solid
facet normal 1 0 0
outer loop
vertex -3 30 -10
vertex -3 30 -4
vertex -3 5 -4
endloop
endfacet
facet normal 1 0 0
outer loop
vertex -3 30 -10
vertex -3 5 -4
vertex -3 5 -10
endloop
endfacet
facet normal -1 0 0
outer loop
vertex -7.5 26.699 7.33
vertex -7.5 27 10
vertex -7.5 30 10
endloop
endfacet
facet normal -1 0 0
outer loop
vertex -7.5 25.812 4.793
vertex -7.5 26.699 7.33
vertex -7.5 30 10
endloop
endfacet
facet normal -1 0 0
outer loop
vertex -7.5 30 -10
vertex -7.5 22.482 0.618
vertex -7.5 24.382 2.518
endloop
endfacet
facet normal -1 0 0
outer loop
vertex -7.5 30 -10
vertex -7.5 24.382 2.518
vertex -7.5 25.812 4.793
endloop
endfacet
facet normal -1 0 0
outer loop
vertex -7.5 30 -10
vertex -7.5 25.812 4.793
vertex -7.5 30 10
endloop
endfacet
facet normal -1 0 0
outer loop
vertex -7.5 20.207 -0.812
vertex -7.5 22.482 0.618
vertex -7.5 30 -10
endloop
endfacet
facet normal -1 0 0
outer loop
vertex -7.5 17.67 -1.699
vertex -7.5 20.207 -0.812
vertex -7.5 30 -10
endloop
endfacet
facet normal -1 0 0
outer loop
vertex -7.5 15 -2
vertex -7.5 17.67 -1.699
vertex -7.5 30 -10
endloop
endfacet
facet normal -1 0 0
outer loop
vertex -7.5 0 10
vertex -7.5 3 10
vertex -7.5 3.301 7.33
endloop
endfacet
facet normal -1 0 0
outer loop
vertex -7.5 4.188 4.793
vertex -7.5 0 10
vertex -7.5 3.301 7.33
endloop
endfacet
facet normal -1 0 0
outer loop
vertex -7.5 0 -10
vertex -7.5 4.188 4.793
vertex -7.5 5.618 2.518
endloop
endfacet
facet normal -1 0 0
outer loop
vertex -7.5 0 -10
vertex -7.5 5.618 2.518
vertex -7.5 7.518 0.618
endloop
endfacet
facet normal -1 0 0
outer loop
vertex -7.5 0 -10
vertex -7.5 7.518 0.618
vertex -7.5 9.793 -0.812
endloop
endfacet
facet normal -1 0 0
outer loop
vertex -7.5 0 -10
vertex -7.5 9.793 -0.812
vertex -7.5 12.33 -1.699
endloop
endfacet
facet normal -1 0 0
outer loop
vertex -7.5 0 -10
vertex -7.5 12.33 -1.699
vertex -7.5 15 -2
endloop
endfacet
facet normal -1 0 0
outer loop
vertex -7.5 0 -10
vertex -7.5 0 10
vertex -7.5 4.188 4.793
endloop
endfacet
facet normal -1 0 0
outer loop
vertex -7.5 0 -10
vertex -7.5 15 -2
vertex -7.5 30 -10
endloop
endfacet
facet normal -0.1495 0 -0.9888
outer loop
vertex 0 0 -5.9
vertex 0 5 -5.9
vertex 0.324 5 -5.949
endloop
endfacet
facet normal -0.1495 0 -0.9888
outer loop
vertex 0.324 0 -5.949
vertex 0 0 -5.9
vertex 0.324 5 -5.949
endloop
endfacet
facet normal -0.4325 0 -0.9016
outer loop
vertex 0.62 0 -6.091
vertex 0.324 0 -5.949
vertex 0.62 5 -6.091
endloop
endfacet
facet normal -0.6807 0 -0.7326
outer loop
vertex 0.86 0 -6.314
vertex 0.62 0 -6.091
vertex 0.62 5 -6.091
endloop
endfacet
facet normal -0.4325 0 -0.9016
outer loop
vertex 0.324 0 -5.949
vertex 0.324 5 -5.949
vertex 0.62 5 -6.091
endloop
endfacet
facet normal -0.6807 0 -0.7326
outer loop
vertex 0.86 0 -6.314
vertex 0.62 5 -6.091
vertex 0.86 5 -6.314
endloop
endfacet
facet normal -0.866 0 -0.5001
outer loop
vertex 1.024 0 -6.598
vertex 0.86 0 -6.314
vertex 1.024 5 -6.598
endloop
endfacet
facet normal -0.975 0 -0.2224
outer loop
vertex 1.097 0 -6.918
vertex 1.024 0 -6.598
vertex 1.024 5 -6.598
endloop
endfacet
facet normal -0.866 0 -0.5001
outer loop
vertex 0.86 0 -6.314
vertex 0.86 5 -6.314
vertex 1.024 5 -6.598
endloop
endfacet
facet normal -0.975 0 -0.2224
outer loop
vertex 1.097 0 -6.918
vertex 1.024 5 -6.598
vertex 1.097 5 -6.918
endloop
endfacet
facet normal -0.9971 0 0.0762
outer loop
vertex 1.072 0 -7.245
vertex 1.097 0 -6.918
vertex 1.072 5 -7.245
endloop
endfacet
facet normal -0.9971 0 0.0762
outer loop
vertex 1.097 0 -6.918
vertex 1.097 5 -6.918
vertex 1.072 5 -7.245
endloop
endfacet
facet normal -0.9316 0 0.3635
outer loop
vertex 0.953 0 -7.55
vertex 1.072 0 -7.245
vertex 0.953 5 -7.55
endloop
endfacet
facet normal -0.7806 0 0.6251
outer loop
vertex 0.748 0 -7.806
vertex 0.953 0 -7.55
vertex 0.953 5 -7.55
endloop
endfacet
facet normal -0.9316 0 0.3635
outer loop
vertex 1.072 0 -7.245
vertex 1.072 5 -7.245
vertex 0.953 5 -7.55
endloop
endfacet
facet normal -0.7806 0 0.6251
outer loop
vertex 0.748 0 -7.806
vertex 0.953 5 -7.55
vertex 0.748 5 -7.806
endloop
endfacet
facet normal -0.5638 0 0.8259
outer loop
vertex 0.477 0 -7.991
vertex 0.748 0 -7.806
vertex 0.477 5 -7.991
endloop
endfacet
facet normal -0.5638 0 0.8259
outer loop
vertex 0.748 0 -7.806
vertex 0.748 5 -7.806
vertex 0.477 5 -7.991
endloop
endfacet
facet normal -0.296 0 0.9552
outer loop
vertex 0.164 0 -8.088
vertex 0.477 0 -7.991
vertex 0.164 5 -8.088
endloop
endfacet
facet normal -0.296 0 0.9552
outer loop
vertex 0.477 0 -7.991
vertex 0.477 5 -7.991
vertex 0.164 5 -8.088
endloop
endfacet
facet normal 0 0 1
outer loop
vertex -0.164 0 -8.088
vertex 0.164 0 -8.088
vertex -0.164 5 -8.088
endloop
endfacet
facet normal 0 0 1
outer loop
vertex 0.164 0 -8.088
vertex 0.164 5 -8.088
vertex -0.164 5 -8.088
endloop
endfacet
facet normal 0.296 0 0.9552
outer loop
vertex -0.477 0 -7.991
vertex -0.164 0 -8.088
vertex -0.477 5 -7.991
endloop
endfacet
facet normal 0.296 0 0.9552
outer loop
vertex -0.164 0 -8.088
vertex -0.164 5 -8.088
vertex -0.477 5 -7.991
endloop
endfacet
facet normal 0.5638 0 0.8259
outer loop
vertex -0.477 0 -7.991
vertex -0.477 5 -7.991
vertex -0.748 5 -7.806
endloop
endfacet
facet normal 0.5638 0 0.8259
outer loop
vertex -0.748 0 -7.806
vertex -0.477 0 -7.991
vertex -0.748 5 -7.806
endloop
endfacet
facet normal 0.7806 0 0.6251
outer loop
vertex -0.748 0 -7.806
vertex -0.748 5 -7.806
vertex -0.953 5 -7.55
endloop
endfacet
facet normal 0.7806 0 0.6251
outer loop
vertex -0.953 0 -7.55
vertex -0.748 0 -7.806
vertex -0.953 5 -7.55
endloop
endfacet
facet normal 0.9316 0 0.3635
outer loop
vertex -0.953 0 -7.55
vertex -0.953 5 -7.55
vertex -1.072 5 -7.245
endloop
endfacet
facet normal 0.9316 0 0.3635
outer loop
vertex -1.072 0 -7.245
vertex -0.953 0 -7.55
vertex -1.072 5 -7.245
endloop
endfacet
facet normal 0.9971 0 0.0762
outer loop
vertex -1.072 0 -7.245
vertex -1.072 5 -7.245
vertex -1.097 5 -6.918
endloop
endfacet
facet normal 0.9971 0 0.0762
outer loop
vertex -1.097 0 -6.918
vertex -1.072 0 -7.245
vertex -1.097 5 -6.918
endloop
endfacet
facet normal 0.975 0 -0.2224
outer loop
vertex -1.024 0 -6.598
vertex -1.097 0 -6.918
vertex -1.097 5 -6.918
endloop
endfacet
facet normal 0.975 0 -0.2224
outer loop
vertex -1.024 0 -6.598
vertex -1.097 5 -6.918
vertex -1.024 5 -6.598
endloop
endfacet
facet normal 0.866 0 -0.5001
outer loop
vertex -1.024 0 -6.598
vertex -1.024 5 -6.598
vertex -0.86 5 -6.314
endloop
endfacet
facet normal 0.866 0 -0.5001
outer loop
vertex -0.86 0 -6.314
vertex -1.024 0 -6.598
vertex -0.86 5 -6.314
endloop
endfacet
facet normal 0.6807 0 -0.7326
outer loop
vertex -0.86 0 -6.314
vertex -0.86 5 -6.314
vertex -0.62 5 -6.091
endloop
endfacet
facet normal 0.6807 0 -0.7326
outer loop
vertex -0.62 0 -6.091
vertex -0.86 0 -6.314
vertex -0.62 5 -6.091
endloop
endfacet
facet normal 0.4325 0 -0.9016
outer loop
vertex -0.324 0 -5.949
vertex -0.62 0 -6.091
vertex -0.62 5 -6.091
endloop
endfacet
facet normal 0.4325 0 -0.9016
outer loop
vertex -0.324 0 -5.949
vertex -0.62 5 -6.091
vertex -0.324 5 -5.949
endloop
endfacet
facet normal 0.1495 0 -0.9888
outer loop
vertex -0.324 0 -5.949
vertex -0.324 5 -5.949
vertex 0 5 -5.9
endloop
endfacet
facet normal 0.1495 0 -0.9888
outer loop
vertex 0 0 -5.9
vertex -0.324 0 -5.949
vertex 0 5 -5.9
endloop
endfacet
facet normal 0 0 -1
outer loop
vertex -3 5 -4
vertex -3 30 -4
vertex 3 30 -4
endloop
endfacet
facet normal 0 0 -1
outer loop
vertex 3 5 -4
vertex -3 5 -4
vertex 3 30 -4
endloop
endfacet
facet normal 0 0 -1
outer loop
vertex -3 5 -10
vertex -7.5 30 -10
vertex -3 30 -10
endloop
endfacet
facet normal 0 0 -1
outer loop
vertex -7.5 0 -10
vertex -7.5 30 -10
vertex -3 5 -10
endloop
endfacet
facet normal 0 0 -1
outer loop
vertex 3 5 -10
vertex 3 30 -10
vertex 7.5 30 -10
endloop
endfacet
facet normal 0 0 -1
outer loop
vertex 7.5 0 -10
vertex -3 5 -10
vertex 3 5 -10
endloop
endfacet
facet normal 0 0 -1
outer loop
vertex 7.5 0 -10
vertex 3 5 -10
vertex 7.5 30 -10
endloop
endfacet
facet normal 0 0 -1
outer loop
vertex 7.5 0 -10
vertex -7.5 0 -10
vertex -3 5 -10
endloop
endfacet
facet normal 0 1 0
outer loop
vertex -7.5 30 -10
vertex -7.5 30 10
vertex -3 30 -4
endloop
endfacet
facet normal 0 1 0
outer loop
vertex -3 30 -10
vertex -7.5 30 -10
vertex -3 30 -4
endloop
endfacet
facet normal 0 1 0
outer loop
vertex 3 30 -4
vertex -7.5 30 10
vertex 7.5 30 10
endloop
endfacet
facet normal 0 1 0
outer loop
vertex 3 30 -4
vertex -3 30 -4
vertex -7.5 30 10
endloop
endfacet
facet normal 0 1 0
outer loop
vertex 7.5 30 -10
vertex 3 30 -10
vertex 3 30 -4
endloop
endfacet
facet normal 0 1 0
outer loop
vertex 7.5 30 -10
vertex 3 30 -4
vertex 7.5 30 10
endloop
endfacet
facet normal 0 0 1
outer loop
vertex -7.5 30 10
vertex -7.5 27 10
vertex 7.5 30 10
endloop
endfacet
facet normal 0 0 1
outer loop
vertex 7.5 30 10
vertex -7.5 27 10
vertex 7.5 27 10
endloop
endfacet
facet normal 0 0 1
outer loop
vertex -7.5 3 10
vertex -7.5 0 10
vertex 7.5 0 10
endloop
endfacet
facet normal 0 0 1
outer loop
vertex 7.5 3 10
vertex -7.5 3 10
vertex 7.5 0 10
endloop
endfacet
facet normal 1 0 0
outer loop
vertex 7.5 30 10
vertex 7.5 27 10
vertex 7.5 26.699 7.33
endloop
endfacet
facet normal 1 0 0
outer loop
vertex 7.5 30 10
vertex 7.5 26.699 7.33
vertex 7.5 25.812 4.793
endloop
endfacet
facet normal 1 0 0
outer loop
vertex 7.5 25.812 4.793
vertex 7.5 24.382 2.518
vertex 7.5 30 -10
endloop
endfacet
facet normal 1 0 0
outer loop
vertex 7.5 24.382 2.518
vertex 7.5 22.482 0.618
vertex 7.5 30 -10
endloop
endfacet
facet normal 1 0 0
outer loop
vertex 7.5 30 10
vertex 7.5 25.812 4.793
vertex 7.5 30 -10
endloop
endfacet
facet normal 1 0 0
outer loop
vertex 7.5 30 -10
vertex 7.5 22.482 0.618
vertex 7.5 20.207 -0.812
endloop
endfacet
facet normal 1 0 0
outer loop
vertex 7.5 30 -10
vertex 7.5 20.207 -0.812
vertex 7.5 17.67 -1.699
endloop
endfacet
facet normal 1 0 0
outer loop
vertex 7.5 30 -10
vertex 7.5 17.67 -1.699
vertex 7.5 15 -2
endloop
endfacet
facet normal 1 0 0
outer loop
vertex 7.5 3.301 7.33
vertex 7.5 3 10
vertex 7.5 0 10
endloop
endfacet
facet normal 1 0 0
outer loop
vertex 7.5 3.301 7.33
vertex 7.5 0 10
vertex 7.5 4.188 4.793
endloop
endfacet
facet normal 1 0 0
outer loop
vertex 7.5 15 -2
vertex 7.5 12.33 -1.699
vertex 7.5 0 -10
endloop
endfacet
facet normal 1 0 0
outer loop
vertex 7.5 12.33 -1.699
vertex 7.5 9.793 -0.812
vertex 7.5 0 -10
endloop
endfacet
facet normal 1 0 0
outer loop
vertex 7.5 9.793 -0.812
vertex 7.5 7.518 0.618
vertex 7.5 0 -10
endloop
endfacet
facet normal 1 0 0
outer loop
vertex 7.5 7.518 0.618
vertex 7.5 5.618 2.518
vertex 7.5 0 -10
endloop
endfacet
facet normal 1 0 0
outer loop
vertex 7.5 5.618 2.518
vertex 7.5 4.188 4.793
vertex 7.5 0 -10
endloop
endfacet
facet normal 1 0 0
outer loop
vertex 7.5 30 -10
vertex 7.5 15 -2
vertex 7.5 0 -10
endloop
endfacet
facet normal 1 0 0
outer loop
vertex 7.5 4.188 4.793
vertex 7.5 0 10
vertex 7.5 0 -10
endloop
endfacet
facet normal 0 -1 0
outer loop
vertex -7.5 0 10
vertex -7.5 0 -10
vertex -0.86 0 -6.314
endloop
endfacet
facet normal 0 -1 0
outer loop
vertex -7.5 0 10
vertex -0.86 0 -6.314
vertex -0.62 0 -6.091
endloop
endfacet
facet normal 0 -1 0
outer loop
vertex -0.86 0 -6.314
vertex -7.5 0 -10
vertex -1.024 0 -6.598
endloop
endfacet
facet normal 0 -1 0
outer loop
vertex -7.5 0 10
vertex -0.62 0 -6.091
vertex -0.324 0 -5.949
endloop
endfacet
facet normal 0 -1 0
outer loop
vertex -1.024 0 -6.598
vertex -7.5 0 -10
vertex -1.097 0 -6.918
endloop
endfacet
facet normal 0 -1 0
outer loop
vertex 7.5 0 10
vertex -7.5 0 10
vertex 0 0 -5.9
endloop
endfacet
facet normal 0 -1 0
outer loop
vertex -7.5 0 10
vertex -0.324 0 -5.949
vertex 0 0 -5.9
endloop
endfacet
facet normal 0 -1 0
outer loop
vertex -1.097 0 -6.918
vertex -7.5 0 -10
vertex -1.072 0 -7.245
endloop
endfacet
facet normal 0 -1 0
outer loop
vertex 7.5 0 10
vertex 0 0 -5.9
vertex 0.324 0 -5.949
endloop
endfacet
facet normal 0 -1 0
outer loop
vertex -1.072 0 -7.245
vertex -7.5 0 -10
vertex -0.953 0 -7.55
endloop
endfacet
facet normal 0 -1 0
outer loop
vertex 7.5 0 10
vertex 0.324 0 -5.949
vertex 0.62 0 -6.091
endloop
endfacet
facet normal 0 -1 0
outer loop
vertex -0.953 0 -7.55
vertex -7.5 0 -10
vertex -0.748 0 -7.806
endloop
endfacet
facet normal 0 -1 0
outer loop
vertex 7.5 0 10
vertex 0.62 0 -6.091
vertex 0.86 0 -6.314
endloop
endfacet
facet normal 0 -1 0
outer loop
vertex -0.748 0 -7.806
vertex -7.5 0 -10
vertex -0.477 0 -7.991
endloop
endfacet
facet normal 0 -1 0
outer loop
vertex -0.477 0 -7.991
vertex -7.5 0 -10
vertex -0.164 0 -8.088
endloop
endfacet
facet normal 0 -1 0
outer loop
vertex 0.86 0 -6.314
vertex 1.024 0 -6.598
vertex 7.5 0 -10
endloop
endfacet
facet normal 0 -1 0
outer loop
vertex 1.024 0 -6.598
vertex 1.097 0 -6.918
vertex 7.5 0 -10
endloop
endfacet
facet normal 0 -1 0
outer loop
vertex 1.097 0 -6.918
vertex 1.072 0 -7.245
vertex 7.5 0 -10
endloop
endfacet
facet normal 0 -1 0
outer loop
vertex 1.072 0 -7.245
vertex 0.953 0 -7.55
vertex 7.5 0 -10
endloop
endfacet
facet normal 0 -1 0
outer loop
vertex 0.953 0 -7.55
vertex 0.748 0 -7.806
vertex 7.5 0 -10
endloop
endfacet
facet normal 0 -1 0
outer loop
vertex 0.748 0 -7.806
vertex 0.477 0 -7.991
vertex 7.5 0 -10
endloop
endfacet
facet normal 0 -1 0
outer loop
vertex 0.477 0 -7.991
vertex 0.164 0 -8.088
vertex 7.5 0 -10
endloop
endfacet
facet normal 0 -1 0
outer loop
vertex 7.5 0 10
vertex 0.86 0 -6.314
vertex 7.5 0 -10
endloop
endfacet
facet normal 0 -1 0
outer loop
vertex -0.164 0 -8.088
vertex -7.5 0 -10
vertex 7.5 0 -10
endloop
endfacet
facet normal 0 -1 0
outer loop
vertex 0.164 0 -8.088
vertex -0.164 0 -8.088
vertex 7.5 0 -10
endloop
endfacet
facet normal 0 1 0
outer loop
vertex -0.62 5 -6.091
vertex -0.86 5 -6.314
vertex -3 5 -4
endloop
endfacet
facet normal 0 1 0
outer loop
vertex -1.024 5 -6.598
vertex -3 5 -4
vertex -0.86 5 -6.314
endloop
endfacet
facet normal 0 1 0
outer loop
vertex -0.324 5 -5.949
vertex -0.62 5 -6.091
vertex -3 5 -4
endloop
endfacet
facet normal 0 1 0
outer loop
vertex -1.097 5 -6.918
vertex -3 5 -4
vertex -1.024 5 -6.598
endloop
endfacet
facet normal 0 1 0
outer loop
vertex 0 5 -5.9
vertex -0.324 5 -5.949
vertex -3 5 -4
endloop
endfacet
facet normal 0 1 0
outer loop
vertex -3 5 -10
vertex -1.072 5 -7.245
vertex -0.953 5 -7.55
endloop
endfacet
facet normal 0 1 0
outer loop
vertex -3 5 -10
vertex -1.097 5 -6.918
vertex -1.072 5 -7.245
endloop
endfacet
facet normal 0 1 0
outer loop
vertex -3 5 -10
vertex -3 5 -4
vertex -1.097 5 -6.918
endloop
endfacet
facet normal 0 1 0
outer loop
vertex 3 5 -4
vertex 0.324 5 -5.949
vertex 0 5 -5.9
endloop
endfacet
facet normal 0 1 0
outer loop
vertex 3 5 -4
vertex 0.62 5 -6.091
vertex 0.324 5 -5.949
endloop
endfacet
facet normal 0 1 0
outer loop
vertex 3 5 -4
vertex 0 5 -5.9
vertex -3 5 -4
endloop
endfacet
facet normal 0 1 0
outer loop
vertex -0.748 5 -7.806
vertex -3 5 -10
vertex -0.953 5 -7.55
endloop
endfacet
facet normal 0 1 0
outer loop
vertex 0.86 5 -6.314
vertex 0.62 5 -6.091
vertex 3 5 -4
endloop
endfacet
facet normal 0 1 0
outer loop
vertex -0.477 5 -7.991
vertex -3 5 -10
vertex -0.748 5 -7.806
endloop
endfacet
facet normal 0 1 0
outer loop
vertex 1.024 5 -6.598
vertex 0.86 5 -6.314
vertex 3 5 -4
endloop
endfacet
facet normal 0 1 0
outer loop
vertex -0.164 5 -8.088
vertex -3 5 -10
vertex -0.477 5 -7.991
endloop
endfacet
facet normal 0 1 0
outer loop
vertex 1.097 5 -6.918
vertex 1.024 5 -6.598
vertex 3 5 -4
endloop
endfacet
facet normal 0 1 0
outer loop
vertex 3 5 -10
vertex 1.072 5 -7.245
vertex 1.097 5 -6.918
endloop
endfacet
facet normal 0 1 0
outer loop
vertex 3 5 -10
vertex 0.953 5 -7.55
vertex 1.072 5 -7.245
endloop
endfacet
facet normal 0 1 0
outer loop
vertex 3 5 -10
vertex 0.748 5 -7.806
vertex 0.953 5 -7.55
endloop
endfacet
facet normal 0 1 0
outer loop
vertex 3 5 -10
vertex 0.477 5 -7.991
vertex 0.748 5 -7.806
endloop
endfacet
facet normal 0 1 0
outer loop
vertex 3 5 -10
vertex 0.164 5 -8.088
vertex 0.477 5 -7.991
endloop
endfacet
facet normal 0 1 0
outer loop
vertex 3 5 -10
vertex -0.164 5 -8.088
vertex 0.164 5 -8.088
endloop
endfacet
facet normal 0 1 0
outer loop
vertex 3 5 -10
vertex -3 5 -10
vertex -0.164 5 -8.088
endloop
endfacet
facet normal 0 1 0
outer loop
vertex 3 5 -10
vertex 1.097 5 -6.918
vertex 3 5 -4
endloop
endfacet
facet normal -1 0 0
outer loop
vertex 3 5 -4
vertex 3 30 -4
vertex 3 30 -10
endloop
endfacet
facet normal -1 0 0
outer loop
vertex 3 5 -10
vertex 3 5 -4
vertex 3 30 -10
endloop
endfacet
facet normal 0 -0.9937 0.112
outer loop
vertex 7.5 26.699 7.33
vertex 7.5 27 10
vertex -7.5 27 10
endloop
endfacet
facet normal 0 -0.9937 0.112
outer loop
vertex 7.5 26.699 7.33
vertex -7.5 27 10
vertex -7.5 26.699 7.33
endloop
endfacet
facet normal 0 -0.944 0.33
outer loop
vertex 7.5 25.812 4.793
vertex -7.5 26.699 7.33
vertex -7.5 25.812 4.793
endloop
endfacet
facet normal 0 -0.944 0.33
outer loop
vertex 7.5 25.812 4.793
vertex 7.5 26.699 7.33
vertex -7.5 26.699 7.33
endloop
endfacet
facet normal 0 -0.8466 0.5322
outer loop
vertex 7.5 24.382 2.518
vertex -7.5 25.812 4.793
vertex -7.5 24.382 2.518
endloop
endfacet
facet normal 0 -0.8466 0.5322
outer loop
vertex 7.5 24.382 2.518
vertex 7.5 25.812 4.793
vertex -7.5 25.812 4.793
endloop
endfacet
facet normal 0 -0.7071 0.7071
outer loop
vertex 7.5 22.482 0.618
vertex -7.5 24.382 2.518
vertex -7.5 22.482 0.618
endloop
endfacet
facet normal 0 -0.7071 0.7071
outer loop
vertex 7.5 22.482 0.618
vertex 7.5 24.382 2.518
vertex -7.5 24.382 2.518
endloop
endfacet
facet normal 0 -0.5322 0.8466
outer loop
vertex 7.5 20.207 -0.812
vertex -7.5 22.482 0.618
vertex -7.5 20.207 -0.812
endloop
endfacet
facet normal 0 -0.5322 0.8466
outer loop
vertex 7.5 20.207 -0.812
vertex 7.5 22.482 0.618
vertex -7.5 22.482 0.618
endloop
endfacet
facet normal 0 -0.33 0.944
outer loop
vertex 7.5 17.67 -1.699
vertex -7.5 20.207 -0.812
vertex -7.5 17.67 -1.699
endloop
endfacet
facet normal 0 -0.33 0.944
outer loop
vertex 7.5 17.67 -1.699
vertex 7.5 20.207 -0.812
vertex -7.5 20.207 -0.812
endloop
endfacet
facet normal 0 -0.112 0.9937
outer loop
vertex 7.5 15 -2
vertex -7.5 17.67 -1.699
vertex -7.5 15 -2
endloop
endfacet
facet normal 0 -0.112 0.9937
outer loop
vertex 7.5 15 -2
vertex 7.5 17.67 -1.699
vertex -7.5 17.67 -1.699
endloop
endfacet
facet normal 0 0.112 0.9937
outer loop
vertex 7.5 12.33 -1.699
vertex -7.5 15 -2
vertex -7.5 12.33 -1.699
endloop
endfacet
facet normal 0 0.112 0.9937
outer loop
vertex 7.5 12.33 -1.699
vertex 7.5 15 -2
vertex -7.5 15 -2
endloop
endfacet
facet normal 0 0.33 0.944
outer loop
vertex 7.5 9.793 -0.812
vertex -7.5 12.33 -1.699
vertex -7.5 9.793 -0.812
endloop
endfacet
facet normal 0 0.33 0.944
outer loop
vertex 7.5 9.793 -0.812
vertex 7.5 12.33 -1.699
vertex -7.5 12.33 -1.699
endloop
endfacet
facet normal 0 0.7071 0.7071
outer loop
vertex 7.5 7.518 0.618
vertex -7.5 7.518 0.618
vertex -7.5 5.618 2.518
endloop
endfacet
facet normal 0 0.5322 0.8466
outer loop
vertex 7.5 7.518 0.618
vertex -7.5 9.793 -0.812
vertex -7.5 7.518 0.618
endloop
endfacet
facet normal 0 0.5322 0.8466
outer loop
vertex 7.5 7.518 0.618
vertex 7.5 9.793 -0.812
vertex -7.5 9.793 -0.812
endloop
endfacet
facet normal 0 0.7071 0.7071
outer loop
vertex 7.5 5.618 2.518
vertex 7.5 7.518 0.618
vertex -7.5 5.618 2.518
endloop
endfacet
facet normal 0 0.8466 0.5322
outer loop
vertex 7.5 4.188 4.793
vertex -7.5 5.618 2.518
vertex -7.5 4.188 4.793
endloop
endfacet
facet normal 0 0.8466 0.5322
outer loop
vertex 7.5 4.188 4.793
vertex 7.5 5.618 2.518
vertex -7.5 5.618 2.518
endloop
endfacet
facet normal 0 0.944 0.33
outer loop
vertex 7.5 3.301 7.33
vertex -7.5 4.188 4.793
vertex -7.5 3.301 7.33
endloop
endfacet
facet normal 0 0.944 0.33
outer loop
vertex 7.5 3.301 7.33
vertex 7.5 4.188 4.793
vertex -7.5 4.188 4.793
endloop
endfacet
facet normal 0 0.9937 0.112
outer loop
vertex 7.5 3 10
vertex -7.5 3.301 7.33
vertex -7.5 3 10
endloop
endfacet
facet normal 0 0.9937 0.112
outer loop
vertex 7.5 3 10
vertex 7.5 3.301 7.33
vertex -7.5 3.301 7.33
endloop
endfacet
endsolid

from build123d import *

# Parameters (mm, degrees)
SKETCH1_W           = 15
SKETCH1_H           = 20
BOSS_EXTRUDE1_DEPTH = 30
CUT_EXTRUDE1_REACH  = 37
SKETCH4_W           = 6
SKETCH4_H           = 6
CUT_EXTRUDE4_DEPTH  = 25
CUT_EXTRUDE2_REACH  = 34.5
SKETCH3_R           = 1.1


with BuildPart() as part:
    # Sketch1 → Boss-Extrude1 (new body)
    with BuildSketch(Plane(origin=(0, 0, 0), x_dir=(1, 0, 0), z_dir=(0, 1, 0))):
        Rectangle(SKETCH1_W, SKETCH1_H)
    extrude(amount=BOSS_EXTRUDE1_DEPTH)

    # Sketch2 → Cut-Extrude1 (cut, up to next)
    with BuildSketch(Plane(origin=(7.5, 0, 0), x_dir=(0, 0, -1), z_dir=(1, 0, 0)), mode=Mode.PRIVATE) as cut_extrude1_sk1:
        with BuildLine():
            Line((-10, 3), (-10, 27))
            ThreePointArc((-10, 27), (2, 15), (-10, 3))
        make_face()
    cut_extrude1_tool1 = extrude(cut_extrude1_sk1.sketch, amount=-CUT_EXTRUDE1_REACH, mode=Mode.PRIVATE) & part.part
    add(cut_extrude1_tool1.solids().sort_by_distance((7.5, 15, 4.907042))[0], mode=Mode.SUBTRACT)

    # Sketch4 → Cut-Extrude4 (cut)
    with BuildSketch(Plane(origin=(0, 30, 0), x_dir=(1, 0, 0), z_dir=(0, 1, 0))):
        with Locations((0, 7)):
            Rectangle(SKETCH4_W, SKETCH4_H)
    extrude(amount=-CUT_EXTRUDE4_DEPTH, mode=Mode.SUBTRACT)

    # Sketch3 → Cut-Extrude2 (cut, up to next)
    with BuildSketch(Plane(origin=(0, 30, 0), x_dir=(1, 0, 0), z_dir=(0, 1, 0)), mode=Mode.PRIVATE) as cut_extrude2_sk1:
        with Locations(Location((0, 7, 0), (0, 0, 270))):
            Circle(SKETCH3_R)
    cut_extrude2_tool1 = extrude(cut_extrude2_sk1.sketch, amount=-CUT_EXTRUDE2_REACH, mode=Mode.PRIVATE) & part.part
    add(cut_extrude2_tool1.solids().sort_by_distance((0, 30, -7))[0], mode=Mode.SUBTRACT)


solid = part.part
